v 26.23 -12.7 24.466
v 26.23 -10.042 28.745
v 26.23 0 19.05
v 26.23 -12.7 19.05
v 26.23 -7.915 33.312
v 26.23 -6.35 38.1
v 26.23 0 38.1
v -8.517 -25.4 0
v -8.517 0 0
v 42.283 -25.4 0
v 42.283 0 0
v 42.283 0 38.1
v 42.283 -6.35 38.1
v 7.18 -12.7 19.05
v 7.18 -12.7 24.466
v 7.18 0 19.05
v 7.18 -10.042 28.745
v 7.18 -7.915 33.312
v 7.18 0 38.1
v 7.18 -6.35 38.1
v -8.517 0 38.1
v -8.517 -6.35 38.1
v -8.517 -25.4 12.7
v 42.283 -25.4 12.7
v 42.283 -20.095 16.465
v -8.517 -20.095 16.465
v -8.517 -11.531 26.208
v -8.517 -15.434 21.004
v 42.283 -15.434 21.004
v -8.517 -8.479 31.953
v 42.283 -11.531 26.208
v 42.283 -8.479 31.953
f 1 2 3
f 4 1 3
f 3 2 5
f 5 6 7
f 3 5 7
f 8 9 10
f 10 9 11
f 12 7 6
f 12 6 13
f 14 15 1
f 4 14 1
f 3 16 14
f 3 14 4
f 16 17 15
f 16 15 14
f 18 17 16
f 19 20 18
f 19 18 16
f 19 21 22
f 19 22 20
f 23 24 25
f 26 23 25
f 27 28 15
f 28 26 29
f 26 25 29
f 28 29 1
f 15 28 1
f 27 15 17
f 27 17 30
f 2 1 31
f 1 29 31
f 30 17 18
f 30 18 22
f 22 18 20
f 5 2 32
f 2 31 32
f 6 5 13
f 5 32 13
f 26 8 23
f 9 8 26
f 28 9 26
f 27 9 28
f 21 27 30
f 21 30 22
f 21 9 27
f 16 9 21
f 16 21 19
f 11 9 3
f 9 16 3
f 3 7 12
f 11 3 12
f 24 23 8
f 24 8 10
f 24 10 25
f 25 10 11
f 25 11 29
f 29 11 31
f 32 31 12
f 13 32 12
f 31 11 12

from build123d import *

# Parameters (mm, degrees)
F0_W     = 50.8
F0_H     = 38.1
F1_DEPTH = 25.4
F3_DEPTH = 50.8
F4_W     = 19.05
F4_H     = 12.7
F5_DEPTH = 19.05


with BuildPart() as f1:
    # F0 (on Front) → F1 (new body)
    with BuildSketch(Plane.XZ):
        with Locations((16.882635, 19.05)):
            Rectangle(F0_W, F0_H)
    extrude(amount=F1_DEPTH)

    # F2 (on face) → F3 (cut)
    with BuildSketch(Plane.YZ.offset(42.282635)):
        with BuildLine():
            Line((-25.4, 38.1), (-25.4, 12.7))
            ThreePointArc((-25.4, 12.7), (-13.381807, 23.530105), (-6.35, 38.1))
            Line((-6.35, 38.1), (-25.4, 38.1))
        make_face()
    extrude(amount=-F3_DEPTH, mode=Mode.SUBTRACT)

    # F4 (on face) → F5 (cut)
    with BuildSketch(Plane.XY.offset(38.1)):
        with Locations((16.705383, -6.35)):
            Rectangle(F4_W, F4_H)
    extrude(amount=-F5_DEPTH, mode=Mode.SUBTRACT)


solid = f1.part
